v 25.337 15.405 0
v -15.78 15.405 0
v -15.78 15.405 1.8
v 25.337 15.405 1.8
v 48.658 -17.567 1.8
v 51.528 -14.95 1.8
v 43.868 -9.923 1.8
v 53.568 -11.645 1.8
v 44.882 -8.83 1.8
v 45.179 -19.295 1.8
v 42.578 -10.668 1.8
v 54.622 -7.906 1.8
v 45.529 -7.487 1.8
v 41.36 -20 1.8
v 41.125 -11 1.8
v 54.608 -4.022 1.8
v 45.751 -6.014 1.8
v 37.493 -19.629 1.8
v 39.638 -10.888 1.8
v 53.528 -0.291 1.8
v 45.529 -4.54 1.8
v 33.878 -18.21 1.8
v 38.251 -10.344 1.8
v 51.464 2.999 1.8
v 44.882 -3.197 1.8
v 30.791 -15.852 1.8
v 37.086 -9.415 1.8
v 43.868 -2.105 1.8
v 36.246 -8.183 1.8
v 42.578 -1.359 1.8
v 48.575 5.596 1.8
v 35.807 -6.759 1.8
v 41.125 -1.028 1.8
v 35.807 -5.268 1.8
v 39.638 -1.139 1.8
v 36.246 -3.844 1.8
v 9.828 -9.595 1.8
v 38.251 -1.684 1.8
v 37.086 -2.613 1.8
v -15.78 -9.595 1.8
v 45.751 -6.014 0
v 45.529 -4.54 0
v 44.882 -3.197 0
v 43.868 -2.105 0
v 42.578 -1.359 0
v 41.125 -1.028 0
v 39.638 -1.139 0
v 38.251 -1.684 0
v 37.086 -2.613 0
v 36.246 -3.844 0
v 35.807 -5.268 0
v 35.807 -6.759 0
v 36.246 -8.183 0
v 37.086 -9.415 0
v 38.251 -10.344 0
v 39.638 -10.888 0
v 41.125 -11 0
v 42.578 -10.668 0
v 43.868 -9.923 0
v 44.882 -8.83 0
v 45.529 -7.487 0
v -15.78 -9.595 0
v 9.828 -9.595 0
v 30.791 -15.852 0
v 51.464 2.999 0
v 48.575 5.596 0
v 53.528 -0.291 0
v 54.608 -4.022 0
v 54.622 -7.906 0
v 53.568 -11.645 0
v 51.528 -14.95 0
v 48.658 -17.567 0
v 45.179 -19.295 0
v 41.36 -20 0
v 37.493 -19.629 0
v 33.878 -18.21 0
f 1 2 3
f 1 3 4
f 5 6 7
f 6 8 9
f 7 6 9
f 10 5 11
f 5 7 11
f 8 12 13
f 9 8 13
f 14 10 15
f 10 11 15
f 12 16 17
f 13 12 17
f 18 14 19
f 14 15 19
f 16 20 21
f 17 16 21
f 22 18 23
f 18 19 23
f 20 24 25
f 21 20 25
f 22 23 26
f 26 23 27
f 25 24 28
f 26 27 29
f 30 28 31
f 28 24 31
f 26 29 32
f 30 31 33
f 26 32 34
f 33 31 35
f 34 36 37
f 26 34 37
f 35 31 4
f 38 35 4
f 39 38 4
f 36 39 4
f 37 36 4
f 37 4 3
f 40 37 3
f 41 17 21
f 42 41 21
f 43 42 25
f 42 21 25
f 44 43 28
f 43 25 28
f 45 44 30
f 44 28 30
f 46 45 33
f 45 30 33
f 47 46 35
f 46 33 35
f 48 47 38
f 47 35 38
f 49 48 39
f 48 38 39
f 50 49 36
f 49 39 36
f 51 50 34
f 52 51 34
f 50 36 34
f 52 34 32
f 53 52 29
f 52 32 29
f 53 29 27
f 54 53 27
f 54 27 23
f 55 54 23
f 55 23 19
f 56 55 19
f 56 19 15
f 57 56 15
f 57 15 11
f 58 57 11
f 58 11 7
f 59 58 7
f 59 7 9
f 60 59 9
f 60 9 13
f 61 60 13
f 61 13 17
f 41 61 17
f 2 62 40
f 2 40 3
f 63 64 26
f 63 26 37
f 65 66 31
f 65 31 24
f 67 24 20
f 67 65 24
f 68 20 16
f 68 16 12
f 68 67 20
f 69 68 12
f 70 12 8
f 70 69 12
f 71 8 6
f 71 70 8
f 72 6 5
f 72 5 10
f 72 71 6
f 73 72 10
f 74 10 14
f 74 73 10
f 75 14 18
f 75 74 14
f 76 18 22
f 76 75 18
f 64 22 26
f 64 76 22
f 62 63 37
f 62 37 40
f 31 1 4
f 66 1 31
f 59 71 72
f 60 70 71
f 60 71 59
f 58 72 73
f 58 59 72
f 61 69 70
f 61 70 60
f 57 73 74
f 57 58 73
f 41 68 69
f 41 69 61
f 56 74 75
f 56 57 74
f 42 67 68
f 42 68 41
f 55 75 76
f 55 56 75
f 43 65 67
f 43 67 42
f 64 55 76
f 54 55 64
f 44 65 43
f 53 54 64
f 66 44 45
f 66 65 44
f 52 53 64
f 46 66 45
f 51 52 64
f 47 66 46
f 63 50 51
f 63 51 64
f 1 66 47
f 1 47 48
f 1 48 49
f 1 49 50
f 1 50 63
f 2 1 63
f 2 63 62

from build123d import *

# Parameters (mm, degrees)
RESSALTO_EXTRUS_O3_DEPTH = 1.8
ESBO_O7_R                = 5
CORTE_EXTRUS_O5_DEPTH    = 3


with BuildPart() as part:
    # Esboço1 → Ressalto-extrusão3 (new body)
    with BuildSketch(Plane.XY):
        with BuildLine():
            Line((-15.780332987, 15.405349819), (25.337197849, 15.405349819))
            Line((25.337197849, 15.405349819), (48.575213244, 5.595781738))
            ThreePointArc((48.575213244, 5.595781738), (51.52798537, -14.949789194), (30.790948881, -15.852377581))
            Line((30.790948881, -15.852377581), (9.828194525, -9.594650181))
            Line((9.828194525, -9.594650181), (-15.780332987, -9.594650181))
            Line((-15.780332987, -9.594650181), (-15.780332987, 15.405349819))
        make_face()
    extrude(amount=RESSALTO_EXTRUS_O3_DEPTH)

    # Esboço7 → Corte-extrusão5 (cut)
    with BuildSketch(Plane.XY.offset(1.8)):
        with Locations((40.750876667, -6.013686688)):
            Circle(ESBO_O7_R)
    extrude(amount=-CORTE_EXTRUS_O5_DEPTH, mode=Mode.SUBTRACT)


solid = part.part
